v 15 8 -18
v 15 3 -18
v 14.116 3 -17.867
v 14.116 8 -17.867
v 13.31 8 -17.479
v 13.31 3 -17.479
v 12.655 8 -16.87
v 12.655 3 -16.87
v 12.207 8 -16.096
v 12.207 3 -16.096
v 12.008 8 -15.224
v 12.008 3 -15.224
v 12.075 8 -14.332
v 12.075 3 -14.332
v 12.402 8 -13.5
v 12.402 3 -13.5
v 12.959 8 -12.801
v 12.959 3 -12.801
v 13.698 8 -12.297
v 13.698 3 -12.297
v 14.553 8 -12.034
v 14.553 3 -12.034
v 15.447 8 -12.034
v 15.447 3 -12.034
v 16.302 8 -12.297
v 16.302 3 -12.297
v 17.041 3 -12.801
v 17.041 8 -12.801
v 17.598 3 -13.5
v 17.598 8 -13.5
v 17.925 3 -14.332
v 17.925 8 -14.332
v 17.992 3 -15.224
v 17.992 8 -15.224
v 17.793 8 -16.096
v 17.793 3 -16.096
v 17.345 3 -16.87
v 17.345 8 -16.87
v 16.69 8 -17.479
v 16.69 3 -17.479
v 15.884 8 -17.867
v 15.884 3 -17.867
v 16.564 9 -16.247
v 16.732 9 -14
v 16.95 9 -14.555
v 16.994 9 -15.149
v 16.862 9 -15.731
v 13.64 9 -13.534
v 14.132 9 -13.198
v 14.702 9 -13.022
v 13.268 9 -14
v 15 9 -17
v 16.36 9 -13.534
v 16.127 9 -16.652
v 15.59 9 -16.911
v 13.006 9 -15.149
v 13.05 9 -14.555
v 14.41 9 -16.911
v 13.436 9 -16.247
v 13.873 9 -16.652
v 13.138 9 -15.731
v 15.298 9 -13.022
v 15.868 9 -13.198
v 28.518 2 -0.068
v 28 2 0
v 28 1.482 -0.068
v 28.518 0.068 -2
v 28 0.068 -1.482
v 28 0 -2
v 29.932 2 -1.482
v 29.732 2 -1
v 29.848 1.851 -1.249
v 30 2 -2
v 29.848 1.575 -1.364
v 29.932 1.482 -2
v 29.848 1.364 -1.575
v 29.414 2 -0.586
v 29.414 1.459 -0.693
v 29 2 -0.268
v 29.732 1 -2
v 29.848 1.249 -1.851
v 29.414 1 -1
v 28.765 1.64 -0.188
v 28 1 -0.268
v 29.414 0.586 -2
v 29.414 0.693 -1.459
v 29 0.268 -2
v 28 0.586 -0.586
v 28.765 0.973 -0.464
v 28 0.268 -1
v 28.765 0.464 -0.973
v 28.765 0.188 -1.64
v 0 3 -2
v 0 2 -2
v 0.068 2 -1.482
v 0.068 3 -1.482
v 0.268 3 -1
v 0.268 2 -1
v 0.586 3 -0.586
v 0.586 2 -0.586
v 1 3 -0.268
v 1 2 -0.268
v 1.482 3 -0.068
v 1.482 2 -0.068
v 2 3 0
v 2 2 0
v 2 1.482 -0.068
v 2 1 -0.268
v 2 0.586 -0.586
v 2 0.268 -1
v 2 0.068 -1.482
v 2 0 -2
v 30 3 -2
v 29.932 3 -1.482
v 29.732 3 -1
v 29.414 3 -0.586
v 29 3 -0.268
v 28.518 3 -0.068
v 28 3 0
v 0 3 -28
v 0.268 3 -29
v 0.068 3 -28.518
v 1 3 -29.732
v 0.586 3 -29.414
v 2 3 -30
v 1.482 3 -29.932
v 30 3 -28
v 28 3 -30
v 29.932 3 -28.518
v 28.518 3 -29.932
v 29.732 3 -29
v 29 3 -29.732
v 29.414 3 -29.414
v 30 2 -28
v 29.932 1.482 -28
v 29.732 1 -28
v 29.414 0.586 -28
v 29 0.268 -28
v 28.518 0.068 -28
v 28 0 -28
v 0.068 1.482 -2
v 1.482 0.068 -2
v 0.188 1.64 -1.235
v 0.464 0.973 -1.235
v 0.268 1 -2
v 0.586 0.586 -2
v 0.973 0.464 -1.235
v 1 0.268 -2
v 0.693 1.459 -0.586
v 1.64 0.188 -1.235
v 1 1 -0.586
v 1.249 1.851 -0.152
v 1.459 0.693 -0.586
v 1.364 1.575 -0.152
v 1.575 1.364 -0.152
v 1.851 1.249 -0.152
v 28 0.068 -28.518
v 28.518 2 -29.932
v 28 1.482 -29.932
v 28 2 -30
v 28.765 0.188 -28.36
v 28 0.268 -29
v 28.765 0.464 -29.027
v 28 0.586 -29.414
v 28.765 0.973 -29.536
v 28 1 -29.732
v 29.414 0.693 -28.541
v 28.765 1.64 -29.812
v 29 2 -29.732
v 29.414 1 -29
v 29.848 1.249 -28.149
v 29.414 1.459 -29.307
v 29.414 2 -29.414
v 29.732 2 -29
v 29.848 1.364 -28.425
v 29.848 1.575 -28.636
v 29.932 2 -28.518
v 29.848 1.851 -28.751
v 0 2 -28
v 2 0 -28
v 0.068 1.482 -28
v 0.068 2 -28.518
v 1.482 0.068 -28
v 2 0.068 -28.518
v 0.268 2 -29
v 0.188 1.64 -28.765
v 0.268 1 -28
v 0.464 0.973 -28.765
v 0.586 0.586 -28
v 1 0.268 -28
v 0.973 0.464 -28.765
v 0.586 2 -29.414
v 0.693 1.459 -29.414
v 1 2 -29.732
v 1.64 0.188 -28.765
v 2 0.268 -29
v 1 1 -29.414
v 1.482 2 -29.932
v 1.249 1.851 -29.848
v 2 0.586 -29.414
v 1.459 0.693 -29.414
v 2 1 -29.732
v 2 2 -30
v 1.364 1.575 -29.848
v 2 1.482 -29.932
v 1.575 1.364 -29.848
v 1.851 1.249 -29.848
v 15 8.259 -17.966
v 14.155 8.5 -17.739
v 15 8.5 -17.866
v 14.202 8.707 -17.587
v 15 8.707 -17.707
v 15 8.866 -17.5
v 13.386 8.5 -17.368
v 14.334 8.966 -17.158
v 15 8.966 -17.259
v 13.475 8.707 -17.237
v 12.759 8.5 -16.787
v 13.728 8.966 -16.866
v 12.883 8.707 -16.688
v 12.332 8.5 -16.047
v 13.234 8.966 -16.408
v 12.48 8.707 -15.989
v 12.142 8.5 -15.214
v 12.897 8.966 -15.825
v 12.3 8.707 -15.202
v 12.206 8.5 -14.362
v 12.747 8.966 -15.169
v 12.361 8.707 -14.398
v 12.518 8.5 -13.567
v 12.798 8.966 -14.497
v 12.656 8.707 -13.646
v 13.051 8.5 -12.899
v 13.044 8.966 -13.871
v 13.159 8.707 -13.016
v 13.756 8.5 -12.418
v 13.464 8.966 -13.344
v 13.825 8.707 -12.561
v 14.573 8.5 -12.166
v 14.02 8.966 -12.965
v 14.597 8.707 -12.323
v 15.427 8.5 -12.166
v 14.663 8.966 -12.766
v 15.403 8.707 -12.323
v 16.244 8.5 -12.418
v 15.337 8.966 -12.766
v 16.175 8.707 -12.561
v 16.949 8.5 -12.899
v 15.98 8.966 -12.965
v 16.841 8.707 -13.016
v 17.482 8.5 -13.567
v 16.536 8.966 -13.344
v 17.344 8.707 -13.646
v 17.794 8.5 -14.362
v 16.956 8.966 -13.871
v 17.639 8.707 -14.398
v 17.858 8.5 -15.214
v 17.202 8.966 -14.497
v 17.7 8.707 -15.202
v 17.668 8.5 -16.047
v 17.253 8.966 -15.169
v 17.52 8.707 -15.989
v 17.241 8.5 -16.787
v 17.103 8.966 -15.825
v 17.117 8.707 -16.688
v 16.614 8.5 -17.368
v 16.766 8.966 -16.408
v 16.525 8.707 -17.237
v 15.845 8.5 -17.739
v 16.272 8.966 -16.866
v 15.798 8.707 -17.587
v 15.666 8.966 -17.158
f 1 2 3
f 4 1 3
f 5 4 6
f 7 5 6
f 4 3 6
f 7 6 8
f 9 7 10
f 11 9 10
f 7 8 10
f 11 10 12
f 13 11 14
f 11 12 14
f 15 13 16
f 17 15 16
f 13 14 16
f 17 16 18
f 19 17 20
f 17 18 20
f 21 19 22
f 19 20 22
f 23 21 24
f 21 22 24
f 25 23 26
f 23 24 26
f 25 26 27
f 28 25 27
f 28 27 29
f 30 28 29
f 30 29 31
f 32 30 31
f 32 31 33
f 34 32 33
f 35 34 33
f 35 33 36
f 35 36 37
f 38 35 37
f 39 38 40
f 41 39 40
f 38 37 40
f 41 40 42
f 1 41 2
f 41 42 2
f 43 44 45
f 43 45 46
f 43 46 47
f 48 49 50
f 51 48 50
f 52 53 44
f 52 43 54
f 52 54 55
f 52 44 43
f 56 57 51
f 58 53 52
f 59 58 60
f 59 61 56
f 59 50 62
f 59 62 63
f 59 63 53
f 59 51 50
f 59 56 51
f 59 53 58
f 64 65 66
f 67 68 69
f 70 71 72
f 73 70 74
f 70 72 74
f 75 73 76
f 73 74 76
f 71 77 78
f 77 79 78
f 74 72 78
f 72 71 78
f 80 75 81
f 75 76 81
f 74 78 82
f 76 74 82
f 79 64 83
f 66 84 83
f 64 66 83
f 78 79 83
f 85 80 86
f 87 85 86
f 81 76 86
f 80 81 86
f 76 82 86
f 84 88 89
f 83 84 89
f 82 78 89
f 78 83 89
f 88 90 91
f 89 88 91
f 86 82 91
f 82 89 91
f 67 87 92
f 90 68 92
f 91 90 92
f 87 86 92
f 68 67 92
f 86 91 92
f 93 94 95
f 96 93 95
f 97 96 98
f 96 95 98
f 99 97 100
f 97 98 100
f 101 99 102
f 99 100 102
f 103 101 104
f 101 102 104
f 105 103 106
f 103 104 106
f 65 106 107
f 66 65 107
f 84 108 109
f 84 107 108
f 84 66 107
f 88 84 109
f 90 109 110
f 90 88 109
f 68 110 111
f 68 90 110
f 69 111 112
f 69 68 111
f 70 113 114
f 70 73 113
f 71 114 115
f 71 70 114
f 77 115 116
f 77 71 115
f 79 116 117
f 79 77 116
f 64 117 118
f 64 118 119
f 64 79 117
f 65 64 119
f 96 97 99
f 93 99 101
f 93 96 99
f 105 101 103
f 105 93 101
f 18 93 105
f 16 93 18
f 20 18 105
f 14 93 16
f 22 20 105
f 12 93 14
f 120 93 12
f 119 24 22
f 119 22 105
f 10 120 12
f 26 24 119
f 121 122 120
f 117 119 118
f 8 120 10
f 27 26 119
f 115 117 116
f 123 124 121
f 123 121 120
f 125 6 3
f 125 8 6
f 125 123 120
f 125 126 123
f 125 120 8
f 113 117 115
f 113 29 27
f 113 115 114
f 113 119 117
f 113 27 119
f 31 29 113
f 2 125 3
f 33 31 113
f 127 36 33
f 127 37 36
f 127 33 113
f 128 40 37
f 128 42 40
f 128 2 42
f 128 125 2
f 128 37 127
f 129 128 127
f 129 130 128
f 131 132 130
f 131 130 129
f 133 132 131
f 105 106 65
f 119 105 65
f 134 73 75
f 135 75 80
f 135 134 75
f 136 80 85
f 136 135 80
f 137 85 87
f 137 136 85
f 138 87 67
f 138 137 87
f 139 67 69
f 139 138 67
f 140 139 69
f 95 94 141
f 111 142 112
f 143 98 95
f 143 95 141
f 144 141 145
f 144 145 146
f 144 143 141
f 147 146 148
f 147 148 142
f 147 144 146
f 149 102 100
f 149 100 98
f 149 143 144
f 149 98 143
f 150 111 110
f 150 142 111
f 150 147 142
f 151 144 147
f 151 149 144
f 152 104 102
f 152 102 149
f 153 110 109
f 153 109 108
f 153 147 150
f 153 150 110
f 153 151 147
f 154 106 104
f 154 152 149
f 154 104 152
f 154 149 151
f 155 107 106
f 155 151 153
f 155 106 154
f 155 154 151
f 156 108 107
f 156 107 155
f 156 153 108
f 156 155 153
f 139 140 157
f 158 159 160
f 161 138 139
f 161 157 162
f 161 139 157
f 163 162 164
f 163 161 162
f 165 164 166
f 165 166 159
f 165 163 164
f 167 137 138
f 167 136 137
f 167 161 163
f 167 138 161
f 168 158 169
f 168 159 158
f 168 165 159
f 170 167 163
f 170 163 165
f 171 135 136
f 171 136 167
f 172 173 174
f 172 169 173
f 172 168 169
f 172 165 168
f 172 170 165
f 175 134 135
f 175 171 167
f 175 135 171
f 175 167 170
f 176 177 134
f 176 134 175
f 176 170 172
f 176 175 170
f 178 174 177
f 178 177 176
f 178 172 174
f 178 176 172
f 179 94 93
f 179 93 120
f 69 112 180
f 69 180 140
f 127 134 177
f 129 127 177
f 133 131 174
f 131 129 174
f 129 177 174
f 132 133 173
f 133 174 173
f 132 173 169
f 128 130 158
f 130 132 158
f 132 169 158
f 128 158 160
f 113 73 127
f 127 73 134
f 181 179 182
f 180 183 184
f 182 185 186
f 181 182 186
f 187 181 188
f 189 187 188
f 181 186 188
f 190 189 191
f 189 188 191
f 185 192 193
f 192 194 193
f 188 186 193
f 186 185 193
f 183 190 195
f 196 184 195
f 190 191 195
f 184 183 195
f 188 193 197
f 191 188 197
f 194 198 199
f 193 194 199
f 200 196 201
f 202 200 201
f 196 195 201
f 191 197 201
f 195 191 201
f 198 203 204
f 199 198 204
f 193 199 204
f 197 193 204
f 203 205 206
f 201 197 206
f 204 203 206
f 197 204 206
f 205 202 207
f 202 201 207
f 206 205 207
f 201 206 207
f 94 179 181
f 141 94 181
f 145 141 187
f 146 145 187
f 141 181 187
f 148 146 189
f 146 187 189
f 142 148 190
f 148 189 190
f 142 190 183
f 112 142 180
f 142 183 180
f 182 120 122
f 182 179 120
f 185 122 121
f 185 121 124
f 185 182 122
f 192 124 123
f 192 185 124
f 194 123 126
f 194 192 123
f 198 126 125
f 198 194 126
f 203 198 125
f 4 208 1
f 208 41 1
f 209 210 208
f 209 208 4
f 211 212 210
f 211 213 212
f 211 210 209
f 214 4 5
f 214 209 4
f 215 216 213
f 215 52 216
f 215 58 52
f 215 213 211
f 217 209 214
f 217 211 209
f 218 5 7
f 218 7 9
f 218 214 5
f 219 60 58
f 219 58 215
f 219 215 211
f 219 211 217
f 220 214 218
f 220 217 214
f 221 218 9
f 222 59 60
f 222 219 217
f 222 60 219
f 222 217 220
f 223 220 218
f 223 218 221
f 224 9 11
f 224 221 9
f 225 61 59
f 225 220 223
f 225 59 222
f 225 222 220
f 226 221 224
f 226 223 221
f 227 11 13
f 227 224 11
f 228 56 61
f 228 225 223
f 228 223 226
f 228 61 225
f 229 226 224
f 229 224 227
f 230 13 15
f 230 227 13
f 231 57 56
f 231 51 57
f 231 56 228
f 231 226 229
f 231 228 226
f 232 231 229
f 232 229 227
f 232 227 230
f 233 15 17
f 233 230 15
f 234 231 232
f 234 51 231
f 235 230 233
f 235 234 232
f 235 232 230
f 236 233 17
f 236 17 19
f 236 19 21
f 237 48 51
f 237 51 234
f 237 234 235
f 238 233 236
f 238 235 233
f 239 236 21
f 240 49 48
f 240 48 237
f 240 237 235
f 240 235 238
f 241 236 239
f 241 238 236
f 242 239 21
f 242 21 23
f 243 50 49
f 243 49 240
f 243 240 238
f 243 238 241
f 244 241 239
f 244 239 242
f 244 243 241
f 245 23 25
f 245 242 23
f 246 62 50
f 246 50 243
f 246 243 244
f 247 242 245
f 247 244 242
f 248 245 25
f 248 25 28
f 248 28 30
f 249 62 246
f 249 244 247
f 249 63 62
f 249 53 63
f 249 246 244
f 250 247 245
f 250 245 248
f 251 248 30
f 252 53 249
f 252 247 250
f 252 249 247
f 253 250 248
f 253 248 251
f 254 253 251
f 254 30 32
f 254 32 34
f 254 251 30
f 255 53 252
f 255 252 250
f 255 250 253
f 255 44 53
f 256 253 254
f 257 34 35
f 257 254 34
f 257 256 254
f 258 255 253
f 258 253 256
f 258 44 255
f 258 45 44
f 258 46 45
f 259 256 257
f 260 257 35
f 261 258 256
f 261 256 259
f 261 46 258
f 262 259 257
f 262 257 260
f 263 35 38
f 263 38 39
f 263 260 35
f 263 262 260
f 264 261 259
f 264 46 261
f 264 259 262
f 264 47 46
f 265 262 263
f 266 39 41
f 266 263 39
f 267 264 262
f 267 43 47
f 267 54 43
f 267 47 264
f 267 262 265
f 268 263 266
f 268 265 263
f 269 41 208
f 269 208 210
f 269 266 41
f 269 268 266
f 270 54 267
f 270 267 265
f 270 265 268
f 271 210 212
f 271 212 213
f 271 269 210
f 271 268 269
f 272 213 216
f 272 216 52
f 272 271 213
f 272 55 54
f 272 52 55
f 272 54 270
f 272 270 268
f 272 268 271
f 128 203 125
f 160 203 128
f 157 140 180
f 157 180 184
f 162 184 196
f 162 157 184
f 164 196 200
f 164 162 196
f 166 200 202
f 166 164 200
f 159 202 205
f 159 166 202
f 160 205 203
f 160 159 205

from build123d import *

# Parameters (mm, degrees)
SKETCH1_W           = 30
SKETCH1_H           = 30
BOSS_EXTRUDE1_DEPTH = 3
SKETCH3_R           = 3
BOSS_EXTRUDE2_DEPTH = 6
FILLET2_R           = 1
FILLET3_R           = 2
FILLET4_R           = 2
FILLET5_R           = 2
FILLET6_R           = 2


with BuildPart() as part:
    # Sketch1 → Boss-Extrude1 (new body)
    with BuildSketch(Plane(origin=(0, 0, 0), x_dir=(1, 0, 0), z_dir=(0, 1, 0))):
        with Locations((15, 15)):
            Rectangle(SKETCH1_W, SKETCH1_H)
    extrude(amount=BOSS_EXTRUDE1_DEPTH)

    # Sketch3 → Boss-Extrude2 (add)
    with BuildSketch(Plane(origin=(0, 3, 0), x_dir=(1, 0, 0), z_dir=(0, 1, 0))):
        with Locations(Location((15, 15, 0), (0, 0, 90))):
            Circle(SKETCH3_R)
    extrude(amount=BOSS_EXTRUDE2_DEPTH)

    # Fillet2
    fillet2_edges = [part.edges().sort_by_distance(p)[0] for p in [
        (15, 9, -12),
    ]]
    fillet(fillet2_edges, radius=FILLET2_R)

    # Fillet3
    fillet3_edges = [part.edges().sort_by_distance(p)[0] for p in [
        (15, 0, 0),
        (0, 0, -15),
    ]]
    fillet(fillet3_edges, radius=FILLET3_R)

    # Fillet4
    fillet4_edges = [part.edges().sort_by_distance(p)[0] for p in [
        (30, 0, -16),
        (0.585786438, 0.585786438, -30),
        (30, 0.585786438, -0.585786438),
        (16, 0, -30),
        (0, 2.5, -30),
        (30, 2.5, 0),
    ]]
    fillet(fillet4_edges, radius=FILLET4_R)

    # Fillet5
    # the kernel refuses this fillet: 2 mm, written as the material it takes off along each edge
    with BuildSketch(Plane(origin=(2, 2, -2), x_dir=(-1, 0, 0), z_dir=(0, 0, 1))) as fillet5_piece_1_section:
        Polygon((0, 0), (FILLET5_R, 0), (FILLET5_R, FILLET5_R), (0, FILLET5_R), align=None)
    fillet5_piece_1 = extrude(amount=FILLET5_R, mode=Mode.PRIVATE)
    fillet5_piece_1 = fillet5_piece_1 - Plane(origin=(2, 2, -2), x_dir=(0.7071067811865475, 0.7071067811865475, 0), z_dir=(0, 0, 1)) * Sphere(FILLET5_R, mode=Mode.PRIVATE)
    add(fillet5_piece_1, mode=Mode.SUBTRACT)
    with BuildSketch(Plane(origin=(0, 2, 0), x_dir=(1, 0, 0), z_dir=(0, 1, 0))) as fillet5_piece_2:
        with BuildLine():
            CenterArc((FILLET5_R, FILLET5_R), FILLET5_R, 180, 90)
            Line((0, FILLET5_R), (0, 0))
            Line((0, 0), (FILLET5_R, 0))
        make_face()
    extrude(amount=6, mode=Mode.SUBTRACT)

    # Fillet6
    # the kernel refuses this fillet: 2 mm, written as the material it takes off along each edge
    with BuildSketch(Plane(origin=(28, 2, -28), x_dir=(0, 0, -1), z_dir=(1, 0, 0))) as fillet6_piece_1_section:
        Polygon((0, 0), (FILLET6_R, 0), (FILLET6_R, -FILLET6_R), (0, -FILLET6_R), align=None)
    fillet6_piece_1 = extrude(amount=FILLET6_R, mode=Mode.PRIVATE)
    fillet6_piece_1 = fillet6_piece_1 - Plane(origin=(28, 2, -28), x_dir=(0, 0.7071067811865475, 0.7071067811865475), z_dir=(1, 0, 0)) * Sphere(FILLET6_R, mode=Mode.PRIVATE)
    add(fillet6_piece_1, mode=Mode.SUBTRACT)
    with BuildSketch(Plane(origin=(30, 2, -30), x_dir=(0, 0, 1), z_dir=(0, 1, 0))) as fillet6_piece_2:
        with BuildLine():
            CenterArc((FILLET6_R, -FILLET6_R), FILLET6_R, 90, 90)
            Line((0, -FILLET6_R), (0, 0))
            Line((0, 0), (FILLET6_R, 0))
        make_face()
    extrude(amount=6, mode=Mode.SUBTRACT)


solid = part.part
